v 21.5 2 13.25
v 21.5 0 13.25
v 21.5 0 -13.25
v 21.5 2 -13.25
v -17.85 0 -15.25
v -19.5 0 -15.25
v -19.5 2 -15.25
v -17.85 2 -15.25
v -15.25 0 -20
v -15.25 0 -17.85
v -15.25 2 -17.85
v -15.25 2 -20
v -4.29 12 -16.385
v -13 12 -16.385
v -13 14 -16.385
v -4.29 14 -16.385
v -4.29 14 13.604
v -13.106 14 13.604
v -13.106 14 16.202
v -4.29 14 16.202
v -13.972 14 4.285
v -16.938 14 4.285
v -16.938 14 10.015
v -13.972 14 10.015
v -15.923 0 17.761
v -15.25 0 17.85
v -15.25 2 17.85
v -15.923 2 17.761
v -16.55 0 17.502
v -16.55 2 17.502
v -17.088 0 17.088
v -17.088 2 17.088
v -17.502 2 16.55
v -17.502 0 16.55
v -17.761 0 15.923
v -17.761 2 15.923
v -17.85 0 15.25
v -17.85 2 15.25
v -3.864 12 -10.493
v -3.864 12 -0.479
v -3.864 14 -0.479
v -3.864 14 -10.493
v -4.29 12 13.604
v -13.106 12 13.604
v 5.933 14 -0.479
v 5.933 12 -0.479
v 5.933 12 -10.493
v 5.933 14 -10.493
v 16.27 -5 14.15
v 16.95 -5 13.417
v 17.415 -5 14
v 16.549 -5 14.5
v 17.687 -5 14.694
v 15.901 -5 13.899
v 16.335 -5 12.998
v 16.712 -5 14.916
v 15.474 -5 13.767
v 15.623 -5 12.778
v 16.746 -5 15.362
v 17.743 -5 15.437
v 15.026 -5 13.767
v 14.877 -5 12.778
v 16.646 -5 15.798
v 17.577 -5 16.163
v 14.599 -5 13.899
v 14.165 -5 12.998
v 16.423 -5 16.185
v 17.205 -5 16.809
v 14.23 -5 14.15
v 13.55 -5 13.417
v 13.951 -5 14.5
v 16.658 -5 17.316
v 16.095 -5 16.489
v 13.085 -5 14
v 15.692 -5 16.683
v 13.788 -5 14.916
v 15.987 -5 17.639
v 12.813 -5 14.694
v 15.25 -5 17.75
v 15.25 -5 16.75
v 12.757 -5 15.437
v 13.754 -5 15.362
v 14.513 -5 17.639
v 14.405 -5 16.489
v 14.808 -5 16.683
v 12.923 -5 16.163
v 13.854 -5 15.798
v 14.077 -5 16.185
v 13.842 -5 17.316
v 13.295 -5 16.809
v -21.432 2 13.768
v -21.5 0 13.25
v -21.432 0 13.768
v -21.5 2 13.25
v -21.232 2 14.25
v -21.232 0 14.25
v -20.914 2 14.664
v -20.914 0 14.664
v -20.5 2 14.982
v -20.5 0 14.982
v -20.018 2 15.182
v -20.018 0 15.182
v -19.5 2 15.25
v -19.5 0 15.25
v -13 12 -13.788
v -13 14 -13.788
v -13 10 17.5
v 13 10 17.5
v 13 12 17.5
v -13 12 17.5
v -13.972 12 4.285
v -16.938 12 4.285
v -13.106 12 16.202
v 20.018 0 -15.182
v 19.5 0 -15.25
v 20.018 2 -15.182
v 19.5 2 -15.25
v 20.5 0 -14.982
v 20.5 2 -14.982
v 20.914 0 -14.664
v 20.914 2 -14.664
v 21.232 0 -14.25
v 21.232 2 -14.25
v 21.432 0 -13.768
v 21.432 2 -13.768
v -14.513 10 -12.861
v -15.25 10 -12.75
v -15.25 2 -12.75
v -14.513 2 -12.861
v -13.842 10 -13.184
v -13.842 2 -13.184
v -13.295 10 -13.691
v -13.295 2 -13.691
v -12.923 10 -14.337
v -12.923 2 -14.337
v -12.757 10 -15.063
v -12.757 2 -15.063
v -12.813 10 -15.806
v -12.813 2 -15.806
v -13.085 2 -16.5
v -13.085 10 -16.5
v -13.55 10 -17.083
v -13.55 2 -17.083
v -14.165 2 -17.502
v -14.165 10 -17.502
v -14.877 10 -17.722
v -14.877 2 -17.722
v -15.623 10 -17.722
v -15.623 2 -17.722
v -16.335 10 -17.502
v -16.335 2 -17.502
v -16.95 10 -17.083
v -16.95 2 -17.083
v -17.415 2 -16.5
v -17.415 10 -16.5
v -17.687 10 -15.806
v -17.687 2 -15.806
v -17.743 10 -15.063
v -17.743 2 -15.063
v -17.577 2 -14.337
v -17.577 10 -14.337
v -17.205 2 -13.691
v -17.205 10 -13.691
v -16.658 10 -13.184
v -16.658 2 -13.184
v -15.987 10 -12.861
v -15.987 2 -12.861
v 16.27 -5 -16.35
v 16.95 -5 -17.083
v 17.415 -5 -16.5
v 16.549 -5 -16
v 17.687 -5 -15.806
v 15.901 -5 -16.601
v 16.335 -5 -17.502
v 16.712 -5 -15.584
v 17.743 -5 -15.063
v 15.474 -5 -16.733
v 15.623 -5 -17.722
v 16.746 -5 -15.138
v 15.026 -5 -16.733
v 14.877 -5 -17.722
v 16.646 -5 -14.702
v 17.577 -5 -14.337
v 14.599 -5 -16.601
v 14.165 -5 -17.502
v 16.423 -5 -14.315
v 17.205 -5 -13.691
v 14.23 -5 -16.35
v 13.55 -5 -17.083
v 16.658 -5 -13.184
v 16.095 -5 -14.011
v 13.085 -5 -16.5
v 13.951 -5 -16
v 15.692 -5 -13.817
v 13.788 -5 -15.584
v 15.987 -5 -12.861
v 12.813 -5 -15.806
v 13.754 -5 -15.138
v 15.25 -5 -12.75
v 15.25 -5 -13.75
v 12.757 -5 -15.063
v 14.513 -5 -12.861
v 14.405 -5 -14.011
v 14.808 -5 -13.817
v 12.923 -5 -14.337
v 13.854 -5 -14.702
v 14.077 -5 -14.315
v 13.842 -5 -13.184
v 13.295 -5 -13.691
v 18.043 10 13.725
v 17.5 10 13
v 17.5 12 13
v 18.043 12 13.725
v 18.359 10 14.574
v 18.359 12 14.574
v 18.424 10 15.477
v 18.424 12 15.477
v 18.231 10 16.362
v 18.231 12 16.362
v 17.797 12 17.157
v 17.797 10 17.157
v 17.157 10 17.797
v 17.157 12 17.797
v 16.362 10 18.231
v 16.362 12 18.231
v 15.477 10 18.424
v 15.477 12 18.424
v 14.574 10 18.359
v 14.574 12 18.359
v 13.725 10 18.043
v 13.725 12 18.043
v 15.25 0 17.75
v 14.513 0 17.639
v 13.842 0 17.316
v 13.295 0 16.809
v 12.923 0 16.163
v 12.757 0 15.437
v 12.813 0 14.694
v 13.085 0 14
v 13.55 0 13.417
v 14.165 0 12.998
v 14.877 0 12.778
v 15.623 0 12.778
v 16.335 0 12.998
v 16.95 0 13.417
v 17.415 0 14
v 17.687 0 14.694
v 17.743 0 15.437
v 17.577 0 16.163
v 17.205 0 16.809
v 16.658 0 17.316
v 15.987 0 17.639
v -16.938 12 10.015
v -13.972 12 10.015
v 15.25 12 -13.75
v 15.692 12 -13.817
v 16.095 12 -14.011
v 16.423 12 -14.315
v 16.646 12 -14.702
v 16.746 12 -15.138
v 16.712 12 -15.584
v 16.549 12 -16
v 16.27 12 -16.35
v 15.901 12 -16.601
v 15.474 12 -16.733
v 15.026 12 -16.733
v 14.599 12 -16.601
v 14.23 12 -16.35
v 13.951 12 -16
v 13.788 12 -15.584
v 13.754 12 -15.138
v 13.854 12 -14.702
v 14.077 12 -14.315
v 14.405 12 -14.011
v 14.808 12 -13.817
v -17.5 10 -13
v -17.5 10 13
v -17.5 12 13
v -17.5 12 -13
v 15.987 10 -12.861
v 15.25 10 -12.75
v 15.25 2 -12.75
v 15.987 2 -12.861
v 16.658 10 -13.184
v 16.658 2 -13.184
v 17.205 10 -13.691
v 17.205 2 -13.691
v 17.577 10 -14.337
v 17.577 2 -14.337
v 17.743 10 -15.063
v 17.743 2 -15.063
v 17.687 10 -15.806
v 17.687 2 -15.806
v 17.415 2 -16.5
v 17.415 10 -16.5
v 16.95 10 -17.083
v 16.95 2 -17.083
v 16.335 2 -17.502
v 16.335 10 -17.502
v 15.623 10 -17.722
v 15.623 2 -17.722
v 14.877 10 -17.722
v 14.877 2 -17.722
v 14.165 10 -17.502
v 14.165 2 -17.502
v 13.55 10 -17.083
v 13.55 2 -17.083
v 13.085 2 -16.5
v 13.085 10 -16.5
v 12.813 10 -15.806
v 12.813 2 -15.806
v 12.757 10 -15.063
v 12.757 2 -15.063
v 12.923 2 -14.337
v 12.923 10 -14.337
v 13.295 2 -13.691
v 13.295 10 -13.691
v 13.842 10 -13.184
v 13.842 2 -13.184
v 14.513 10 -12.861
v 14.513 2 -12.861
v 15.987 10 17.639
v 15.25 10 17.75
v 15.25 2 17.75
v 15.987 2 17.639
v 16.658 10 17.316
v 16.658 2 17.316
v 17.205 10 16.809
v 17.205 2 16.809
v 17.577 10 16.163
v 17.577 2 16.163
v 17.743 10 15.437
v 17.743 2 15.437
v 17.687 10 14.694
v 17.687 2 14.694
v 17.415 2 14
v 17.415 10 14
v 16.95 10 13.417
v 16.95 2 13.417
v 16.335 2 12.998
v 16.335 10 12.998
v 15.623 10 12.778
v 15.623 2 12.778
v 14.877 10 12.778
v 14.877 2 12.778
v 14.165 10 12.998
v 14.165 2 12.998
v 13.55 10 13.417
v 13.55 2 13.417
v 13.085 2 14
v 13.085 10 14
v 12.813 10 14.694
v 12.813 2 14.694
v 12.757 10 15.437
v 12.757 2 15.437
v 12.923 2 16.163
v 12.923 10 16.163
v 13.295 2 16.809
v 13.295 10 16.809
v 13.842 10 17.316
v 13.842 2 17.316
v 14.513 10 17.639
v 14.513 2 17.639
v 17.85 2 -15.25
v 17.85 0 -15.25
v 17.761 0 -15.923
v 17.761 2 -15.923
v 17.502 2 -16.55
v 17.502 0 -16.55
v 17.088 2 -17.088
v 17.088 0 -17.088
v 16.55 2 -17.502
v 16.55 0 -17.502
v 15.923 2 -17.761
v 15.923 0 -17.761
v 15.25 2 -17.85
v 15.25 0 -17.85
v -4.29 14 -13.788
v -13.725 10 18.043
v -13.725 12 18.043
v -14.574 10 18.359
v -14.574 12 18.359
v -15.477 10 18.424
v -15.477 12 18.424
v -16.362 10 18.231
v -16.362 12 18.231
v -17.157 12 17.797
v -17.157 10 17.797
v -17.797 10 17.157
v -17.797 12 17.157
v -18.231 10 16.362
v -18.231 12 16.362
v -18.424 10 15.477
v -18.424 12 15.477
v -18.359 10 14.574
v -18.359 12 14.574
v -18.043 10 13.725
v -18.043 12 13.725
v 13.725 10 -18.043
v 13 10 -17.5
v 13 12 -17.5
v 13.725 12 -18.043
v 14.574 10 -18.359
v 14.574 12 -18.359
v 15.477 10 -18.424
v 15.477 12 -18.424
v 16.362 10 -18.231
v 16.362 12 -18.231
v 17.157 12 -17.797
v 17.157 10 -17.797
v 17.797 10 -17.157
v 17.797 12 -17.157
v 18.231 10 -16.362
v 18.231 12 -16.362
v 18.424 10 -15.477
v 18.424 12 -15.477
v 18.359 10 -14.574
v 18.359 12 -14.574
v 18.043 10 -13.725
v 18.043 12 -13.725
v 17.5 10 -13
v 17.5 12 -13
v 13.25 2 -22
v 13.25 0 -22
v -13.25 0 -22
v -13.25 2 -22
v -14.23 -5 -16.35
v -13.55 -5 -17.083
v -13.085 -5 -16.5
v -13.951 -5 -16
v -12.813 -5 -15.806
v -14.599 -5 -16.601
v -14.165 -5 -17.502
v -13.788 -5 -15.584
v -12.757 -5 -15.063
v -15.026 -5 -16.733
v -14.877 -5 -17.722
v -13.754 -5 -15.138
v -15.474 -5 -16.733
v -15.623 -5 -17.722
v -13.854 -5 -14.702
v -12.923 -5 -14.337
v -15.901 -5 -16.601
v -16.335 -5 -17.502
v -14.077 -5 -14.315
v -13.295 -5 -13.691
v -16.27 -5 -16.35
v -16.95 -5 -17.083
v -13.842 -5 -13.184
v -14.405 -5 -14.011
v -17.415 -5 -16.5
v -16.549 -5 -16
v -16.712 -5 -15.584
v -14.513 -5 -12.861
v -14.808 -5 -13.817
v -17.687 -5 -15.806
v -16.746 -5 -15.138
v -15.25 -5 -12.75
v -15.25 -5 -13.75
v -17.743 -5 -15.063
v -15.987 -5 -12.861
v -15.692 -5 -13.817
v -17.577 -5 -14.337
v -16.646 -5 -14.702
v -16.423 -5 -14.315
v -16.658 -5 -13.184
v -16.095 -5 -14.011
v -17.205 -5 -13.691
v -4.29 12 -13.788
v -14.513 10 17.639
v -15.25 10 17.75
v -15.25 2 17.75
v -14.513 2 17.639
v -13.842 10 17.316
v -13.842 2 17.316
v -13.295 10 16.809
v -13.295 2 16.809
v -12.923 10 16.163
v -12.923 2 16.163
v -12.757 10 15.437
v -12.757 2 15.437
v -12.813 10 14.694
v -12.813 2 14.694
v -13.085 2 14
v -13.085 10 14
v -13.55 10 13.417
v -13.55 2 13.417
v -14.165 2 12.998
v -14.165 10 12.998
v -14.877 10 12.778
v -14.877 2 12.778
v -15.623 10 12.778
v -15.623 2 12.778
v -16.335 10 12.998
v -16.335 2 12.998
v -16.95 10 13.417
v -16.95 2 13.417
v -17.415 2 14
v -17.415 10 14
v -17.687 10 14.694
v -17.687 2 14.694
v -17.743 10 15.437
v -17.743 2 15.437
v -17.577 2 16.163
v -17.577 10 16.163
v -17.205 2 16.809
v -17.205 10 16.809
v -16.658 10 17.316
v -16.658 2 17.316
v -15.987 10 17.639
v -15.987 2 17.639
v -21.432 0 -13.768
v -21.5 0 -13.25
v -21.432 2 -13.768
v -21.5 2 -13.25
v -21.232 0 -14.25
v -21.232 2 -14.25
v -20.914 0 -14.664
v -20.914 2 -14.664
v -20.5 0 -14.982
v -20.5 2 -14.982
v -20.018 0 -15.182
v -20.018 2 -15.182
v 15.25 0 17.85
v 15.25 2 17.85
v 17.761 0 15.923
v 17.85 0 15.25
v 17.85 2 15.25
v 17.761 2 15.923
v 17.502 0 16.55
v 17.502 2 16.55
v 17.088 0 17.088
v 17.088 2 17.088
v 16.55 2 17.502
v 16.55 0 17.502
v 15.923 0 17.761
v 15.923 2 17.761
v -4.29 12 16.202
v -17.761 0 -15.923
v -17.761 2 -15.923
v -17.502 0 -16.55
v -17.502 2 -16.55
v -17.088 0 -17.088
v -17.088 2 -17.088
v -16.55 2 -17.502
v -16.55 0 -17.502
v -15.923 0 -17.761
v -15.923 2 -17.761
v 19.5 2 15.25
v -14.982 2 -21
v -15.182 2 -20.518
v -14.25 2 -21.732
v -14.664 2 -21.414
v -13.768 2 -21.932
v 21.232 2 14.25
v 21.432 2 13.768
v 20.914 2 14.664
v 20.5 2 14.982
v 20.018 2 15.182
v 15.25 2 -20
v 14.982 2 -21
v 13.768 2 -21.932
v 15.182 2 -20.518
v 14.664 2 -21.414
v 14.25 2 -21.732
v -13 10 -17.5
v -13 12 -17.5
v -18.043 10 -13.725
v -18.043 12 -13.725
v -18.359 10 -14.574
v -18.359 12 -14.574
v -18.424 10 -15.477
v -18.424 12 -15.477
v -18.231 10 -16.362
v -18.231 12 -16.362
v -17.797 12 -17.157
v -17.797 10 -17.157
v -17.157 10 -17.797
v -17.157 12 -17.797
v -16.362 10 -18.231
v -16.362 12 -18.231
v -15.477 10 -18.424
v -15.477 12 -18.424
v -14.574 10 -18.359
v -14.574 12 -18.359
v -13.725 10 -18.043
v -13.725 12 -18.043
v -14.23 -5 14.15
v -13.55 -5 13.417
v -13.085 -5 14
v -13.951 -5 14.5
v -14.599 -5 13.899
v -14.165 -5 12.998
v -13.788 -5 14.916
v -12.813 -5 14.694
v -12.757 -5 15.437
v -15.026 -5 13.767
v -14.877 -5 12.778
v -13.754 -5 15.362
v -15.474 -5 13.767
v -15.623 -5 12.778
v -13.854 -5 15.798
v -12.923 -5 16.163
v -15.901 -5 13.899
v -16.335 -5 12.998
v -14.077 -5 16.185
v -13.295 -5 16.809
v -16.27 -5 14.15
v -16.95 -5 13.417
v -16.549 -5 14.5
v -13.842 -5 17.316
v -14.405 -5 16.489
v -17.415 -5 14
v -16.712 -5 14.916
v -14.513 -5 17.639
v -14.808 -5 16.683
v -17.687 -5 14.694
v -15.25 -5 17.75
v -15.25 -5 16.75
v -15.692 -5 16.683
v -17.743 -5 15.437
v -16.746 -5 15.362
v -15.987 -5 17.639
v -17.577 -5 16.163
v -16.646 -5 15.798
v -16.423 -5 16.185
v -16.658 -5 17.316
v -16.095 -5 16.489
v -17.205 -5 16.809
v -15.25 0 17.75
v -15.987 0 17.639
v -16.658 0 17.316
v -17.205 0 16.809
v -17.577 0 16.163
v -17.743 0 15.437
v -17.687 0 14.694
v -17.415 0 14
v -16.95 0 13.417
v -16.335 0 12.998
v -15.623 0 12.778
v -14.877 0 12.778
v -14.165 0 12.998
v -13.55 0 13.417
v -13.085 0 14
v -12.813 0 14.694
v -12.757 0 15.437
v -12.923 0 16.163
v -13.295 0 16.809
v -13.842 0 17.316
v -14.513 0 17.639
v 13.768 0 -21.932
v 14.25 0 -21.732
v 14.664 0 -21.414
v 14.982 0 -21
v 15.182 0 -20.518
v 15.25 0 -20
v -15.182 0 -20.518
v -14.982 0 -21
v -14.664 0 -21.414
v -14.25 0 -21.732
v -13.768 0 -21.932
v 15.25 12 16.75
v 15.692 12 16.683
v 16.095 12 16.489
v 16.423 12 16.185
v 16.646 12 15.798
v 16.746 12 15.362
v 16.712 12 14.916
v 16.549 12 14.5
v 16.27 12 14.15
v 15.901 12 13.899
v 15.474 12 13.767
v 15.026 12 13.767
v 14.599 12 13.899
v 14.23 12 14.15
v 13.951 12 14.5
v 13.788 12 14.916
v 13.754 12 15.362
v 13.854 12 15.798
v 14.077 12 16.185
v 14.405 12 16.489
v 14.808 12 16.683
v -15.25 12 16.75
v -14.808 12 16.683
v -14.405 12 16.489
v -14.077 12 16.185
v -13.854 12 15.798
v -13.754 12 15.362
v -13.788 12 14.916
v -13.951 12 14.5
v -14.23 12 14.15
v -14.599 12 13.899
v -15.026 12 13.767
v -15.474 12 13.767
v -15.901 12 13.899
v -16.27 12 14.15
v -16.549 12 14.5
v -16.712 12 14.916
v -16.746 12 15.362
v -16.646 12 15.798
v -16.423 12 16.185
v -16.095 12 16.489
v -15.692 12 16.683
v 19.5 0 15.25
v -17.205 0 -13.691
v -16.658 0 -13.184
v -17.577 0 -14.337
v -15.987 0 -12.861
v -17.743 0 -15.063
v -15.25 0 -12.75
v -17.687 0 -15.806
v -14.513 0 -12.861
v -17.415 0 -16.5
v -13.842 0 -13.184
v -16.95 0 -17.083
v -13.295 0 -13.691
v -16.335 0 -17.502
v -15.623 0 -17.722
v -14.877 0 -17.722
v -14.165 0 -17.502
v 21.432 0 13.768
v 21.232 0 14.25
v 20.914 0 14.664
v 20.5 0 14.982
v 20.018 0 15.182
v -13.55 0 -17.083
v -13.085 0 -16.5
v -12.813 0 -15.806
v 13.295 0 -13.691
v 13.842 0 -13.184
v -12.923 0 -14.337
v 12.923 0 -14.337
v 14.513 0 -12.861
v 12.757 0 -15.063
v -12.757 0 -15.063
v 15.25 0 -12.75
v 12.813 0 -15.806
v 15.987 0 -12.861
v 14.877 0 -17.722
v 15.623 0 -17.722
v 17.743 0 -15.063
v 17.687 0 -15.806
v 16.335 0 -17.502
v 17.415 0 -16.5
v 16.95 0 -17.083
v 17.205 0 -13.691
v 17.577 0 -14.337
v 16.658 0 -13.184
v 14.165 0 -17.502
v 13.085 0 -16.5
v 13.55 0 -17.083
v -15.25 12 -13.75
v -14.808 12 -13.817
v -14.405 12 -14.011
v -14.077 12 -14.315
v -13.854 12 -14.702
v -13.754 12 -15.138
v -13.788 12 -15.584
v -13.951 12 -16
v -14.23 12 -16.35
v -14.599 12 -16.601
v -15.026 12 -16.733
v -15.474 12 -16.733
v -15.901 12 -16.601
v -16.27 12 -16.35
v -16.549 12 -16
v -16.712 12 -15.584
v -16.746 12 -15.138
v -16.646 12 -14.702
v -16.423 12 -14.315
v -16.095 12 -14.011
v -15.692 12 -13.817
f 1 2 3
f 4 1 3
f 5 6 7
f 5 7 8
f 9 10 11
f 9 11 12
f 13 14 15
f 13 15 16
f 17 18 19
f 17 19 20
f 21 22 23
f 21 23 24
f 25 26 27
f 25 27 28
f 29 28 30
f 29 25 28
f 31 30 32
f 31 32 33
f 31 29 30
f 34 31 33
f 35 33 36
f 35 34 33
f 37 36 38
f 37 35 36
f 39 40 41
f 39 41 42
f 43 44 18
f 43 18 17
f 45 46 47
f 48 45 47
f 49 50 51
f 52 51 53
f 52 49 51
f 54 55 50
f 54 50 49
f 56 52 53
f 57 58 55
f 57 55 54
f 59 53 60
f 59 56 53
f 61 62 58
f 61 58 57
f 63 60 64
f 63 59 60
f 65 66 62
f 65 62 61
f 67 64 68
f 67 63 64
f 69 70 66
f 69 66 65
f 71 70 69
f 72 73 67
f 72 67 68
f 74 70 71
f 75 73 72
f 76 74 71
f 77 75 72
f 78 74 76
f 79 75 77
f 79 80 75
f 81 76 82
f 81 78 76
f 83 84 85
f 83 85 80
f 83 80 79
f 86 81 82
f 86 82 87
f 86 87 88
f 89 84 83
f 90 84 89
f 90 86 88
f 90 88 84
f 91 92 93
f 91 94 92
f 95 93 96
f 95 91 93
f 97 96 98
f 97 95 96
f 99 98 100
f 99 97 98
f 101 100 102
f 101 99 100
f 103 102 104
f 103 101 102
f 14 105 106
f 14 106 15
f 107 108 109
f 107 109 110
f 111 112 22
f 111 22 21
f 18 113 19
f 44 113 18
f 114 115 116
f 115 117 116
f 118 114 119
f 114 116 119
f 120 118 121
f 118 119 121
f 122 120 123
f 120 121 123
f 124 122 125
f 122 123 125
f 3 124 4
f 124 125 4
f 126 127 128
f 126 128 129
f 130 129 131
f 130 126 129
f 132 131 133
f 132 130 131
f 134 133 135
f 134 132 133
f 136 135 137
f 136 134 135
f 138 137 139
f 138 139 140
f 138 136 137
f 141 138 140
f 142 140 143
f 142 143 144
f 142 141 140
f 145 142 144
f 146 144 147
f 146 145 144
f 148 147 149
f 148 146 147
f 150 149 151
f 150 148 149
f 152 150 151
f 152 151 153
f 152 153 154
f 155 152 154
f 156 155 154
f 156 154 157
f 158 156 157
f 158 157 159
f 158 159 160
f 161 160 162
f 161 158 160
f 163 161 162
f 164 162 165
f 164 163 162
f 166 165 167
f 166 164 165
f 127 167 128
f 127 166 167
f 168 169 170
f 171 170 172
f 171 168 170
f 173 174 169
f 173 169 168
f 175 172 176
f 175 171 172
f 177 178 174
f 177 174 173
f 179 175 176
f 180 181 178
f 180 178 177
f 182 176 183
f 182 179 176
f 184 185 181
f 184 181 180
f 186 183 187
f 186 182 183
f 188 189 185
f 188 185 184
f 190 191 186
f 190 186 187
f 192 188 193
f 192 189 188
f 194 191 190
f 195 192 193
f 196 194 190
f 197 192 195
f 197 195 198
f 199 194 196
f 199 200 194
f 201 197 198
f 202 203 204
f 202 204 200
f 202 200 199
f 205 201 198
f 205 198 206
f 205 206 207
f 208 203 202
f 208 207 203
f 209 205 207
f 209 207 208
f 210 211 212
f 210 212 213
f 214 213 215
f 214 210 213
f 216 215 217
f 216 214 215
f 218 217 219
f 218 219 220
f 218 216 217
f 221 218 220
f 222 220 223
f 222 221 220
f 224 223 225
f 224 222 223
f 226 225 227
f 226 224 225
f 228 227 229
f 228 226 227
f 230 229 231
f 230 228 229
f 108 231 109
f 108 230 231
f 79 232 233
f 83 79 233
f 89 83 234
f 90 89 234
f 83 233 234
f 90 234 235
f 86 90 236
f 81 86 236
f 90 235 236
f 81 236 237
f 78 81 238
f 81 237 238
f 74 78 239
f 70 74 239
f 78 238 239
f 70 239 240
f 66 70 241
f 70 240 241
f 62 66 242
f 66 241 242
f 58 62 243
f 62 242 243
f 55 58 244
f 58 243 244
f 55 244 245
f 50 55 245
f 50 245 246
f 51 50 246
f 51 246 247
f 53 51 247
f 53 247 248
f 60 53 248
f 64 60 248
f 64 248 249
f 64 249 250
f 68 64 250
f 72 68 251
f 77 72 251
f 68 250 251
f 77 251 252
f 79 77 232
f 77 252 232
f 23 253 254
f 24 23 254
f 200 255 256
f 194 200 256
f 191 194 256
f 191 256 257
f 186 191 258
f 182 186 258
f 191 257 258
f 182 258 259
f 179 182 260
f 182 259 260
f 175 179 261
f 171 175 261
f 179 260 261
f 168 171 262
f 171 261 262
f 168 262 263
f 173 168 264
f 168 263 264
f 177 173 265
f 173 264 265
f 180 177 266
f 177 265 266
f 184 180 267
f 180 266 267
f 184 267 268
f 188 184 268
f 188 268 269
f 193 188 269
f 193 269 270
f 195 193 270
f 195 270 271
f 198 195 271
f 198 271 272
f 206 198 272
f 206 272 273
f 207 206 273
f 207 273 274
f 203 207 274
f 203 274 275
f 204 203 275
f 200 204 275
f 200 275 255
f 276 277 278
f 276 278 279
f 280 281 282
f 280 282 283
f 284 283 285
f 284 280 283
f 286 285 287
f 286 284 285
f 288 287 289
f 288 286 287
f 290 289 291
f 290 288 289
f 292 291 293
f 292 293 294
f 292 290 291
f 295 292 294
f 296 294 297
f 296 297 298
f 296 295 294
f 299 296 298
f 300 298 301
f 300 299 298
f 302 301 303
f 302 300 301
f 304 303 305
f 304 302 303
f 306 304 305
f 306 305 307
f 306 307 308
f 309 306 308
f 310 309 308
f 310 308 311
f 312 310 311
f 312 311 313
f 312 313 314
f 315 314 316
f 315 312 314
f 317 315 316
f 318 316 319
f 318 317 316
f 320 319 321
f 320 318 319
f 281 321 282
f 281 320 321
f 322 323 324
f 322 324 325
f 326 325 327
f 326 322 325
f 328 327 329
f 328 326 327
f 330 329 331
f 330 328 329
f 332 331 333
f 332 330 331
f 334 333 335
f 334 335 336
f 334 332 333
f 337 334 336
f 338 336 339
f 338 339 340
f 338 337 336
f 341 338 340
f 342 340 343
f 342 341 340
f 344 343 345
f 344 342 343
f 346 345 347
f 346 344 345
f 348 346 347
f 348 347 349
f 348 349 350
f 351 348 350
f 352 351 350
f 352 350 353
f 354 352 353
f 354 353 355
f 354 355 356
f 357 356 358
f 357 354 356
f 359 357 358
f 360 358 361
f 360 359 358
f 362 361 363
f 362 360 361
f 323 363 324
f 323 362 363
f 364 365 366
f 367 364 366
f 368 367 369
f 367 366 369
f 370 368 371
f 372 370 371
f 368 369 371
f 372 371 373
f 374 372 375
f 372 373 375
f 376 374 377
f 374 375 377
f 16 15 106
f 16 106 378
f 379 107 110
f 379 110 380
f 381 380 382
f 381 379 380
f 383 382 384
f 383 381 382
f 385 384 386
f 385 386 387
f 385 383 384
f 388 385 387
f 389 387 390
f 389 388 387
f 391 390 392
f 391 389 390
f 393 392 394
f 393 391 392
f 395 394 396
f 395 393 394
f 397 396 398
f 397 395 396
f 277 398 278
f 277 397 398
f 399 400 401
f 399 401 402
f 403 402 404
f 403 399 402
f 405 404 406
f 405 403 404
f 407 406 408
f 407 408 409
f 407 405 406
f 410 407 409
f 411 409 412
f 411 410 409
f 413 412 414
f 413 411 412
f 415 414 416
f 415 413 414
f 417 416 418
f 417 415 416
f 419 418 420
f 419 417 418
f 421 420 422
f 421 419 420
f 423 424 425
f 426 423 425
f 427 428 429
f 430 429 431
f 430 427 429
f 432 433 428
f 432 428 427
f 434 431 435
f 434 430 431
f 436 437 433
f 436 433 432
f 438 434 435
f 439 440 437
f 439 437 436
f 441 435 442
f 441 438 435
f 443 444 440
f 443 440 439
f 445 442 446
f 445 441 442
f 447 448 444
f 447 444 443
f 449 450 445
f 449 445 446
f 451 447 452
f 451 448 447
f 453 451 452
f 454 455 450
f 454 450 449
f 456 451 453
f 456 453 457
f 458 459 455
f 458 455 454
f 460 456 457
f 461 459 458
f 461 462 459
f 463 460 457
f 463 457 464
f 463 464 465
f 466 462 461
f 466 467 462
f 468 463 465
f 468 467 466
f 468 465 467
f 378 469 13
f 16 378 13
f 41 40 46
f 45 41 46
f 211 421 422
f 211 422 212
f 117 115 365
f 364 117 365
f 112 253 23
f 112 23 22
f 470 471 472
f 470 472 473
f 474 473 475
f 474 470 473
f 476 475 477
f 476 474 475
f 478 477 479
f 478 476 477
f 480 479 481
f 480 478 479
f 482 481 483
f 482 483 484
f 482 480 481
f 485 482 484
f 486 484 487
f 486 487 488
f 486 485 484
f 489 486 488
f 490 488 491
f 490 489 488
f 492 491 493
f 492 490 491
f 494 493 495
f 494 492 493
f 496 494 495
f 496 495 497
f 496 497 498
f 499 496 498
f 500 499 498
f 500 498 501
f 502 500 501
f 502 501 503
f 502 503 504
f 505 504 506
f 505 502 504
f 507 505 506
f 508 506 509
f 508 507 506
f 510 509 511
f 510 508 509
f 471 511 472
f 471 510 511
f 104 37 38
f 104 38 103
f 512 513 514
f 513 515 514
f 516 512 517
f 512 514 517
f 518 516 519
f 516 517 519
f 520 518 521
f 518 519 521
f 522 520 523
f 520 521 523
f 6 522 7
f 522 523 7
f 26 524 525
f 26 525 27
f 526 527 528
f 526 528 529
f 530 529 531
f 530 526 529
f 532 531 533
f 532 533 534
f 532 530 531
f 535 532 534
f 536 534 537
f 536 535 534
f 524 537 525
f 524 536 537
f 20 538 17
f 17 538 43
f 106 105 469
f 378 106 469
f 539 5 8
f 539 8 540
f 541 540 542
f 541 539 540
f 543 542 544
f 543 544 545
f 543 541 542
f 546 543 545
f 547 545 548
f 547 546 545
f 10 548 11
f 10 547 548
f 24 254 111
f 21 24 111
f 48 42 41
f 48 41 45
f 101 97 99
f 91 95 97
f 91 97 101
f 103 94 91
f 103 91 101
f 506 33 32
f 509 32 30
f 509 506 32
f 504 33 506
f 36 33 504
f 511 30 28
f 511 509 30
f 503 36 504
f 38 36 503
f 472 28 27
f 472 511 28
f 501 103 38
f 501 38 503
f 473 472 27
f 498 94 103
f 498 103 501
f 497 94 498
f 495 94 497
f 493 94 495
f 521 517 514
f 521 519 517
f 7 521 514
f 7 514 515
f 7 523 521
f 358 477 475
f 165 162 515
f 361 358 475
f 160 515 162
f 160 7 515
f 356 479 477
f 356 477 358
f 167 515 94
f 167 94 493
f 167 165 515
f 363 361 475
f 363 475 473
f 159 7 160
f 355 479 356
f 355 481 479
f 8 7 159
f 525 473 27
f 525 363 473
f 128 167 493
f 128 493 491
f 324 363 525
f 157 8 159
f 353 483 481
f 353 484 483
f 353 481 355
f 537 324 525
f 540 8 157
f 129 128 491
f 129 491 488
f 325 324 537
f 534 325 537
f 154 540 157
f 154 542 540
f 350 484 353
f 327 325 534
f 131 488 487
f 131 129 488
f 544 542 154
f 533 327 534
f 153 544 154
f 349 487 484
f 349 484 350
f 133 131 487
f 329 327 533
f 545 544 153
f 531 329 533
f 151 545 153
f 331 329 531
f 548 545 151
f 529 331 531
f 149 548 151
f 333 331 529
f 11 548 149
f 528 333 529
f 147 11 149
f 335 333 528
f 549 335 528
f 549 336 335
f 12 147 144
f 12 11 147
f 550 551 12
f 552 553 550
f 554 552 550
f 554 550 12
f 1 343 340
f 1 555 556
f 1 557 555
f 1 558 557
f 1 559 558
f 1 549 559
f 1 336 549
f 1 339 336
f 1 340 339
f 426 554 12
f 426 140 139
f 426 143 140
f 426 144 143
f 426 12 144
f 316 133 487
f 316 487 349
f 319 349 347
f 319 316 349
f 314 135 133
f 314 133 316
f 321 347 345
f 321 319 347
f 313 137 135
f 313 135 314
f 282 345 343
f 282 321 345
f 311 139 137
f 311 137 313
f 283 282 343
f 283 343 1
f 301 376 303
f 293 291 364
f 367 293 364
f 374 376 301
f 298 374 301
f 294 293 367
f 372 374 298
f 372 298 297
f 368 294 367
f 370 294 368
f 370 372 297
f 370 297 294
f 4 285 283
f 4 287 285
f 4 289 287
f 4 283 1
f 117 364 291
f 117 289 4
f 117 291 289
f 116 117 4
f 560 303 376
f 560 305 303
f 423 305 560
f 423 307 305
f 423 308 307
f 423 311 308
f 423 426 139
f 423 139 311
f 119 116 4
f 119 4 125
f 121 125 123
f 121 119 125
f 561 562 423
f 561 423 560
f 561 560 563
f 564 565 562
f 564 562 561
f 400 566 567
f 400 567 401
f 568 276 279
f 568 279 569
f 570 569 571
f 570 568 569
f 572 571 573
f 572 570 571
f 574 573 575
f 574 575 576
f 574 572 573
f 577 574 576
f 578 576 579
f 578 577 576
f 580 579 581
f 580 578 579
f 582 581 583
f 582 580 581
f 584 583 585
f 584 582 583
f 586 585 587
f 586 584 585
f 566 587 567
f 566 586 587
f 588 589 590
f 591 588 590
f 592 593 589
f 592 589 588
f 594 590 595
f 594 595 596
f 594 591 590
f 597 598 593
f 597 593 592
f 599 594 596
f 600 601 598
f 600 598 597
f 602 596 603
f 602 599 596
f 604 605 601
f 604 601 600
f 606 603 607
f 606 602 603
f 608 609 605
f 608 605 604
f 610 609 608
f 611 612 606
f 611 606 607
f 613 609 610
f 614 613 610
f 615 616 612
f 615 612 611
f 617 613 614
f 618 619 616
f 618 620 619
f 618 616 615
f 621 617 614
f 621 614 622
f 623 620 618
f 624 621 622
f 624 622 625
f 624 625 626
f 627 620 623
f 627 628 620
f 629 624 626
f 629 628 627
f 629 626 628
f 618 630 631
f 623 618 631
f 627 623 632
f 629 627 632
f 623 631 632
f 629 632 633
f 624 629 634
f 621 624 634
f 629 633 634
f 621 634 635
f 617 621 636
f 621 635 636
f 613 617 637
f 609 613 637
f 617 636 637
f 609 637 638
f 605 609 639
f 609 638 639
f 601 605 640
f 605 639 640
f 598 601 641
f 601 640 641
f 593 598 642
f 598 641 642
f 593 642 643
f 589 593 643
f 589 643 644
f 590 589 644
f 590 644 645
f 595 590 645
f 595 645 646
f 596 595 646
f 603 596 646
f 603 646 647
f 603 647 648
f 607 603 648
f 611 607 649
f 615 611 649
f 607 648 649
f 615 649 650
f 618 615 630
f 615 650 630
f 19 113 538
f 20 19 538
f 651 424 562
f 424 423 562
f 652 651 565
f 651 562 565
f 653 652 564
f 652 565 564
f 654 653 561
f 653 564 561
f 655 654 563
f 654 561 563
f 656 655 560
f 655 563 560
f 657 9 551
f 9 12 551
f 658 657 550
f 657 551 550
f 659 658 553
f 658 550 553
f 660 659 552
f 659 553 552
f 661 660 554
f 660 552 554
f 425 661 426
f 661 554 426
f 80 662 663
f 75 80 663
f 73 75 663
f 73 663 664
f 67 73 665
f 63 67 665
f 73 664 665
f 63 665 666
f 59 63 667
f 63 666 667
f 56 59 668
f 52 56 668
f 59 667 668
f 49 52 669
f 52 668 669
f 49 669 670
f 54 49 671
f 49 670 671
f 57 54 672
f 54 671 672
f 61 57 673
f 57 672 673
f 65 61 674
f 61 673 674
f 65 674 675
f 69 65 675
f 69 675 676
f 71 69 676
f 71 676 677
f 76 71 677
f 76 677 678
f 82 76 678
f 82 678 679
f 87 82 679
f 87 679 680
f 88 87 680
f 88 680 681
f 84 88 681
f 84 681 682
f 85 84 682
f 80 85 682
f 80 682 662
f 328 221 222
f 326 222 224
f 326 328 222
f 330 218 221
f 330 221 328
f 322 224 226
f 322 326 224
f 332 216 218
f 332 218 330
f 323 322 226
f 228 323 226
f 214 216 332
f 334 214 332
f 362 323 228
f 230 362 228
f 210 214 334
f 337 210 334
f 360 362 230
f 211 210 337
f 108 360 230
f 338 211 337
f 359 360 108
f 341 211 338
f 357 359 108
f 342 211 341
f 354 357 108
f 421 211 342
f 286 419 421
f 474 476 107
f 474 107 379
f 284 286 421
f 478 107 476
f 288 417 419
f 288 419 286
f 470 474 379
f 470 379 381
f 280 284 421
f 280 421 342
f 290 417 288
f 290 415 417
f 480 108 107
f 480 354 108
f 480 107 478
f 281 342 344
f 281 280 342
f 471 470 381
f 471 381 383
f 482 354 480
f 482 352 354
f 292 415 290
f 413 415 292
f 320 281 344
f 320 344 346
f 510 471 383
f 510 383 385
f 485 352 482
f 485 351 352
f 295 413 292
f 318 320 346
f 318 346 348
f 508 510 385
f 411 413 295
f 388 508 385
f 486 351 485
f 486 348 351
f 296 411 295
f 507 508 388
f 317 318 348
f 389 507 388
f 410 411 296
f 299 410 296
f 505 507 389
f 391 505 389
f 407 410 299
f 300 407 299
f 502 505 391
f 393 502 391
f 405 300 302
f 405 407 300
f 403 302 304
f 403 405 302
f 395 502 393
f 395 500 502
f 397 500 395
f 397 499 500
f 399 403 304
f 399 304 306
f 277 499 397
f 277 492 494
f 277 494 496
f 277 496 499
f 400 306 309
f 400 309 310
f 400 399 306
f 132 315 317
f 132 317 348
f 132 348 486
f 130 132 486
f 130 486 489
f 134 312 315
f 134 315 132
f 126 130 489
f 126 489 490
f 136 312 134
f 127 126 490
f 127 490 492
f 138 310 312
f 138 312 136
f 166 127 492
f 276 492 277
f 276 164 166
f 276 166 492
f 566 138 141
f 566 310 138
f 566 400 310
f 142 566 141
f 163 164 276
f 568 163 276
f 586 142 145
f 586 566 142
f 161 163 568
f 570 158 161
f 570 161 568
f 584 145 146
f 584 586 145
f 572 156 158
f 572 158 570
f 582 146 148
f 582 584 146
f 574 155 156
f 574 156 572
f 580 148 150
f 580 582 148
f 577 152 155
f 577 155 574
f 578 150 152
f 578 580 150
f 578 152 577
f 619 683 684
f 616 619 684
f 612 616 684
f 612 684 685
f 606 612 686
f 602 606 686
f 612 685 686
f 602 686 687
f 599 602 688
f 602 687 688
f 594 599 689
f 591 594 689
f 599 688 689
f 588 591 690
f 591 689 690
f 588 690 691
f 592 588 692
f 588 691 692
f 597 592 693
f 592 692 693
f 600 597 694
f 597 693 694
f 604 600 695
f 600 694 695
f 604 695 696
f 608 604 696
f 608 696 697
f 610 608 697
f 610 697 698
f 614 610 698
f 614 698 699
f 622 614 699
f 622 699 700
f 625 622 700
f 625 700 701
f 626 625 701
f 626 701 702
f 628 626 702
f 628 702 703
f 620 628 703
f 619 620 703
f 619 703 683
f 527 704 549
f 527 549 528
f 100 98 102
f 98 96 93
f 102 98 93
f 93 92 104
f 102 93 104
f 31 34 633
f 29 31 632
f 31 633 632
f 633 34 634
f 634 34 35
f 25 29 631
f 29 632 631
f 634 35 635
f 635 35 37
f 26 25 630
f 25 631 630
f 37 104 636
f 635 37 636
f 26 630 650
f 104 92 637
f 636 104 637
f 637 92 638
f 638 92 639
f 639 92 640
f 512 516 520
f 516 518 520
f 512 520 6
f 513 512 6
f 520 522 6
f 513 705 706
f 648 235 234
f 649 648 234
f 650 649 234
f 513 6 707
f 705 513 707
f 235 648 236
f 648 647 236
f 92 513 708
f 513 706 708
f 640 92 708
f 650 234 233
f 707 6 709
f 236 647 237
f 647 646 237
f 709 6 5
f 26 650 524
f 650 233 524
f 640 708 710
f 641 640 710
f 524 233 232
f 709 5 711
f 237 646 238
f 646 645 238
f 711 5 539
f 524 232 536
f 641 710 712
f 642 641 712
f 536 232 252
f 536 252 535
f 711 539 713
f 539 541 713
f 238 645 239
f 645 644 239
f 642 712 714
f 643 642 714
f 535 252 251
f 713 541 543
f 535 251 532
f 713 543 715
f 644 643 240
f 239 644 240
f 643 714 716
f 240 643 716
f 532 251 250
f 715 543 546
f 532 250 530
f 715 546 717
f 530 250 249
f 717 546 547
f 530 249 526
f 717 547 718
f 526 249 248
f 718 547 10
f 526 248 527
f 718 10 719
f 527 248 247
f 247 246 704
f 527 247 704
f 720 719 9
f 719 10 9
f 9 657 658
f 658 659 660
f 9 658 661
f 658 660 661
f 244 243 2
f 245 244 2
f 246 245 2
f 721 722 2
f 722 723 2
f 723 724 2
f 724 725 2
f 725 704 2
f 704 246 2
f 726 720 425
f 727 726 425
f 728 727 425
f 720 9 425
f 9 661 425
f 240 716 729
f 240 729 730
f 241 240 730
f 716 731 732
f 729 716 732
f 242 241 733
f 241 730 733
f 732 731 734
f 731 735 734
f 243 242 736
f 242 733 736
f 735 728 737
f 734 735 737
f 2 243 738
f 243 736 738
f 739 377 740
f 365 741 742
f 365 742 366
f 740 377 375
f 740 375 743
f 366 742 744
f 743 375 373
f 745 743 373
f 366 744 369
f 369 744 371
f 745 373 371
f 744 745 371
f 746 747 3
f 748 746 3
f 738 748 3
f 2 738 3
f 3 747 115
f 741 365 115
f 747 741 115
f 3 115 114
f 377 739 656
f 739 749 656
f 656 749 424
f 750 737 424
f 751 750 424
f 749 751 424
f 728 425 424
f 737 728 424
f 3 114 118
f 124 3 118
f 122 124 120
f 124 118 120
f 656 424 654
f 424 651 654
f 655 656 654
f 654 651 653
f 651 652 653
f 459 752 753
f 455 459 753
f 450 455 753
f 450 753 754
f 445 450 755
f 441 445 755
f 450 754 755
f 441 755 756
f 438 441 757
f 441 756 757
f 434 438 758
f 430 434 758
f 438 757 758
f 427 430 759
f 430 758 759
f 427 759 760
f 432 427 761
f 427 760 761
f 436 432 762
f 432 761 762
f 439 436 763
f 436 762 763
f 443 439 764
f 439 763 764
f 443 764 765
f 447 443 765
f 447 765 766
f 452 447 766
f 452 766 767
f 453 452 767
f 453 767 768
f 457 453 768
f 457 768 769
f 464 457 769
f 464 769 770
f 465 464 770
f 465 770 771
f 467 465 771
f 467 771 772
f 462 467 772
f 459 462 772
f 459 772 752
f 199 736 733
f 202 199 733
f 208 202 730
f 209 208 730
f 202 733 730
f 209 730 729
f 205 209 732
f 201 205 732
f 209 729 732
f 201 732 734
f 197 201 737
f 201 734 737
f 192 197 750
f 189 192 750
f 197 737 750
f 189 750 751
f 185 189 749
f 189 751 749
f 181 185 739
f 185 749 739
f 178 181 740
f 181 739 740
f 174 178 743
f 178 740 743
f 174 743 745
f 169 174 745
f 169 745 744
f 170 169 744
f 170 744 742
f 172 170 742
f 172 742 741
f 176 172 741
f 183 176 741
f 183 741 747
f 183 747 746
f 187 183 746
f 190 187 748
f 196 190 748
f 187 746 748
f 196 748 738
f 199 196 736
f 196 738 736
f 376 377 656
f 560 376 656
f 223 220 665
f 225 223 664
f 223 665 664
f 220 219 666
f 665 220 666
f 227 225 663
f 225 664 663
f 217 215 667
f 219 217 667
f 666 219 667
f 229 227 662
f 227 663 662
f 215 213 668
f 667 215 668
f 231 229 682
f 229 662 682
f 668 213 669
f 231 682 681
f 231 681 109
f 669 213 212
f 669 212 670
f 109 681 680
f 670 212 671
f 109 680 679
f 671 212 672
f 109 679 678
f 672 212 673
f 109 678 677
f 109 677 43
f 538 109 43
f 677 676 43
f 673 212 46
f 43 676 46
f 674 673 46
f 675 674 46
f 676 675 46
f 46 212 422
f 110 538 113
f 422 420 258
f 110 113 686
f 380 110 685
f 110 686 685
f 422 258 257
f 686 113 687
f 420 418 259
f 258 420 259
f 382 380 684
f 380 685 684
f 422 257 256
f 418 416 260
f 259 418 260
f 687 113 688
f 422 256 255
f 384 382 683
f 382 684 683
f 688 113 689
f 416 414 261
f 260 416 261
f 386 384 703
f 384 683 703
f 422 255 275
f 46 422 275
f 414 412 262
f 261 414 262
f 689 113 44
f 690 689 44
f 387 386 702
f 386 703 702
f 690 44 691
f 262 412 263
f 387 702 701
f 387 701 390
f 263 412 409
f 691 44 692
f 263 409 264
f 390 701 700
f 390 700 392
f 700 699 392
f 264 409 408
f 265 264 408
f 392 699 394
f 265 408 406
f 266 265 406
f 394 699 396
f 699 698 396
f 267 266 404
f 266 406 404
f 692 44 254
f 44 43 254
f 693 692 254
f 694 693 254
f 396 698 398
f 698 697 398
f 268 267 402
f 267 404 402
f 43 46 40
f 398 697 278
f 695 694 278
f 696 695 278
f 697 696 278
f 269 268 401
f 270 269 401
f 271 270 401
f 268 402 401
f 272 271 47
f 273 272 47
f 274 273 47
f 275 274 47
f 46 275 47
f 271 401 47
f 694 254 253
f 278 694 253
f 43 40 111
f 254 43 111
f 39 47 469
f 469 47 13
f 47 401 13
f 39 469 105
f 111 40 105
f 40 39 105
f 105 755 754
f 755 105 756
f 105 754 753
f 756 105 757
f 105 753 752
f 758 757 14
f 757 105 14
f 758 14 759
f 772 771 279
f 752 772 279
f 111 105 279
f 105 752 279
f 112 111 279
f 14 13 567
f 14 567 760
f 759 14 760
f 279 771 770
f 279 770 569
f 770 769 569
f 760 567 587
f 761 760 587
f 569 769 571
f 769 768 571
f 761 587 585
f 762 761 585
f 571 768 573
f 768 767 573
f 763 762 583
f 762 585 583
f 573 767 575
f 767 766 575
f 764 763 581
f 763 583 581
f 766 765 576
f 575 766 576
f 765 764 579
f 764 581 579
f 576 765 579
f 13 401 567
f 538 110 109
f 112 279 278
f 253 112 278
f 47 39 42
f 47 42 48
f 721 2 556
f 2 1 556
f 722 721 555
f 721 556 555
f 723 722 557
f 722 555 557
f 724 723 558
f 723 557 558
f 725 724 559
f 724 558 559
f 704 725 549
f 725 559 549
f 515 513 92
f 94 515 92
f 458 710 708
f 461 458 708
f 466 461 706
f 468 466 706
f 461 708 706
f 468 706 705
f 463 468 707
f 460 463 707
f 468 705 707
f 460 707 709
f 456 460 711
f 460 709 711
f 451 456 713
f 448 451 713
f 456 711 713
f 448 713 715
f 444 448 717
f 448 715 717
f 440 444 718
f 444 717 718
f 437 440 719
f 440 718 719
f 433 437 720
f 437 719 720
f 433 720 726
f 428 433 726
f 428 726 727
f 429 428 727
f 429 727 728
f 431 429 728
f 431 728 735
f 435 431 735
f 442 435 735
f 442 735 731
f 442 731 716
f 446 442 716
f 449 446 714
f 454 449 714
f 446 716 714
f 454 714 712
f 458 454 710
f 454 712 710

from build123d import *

# Parameters (mm, degrees)
EXTRUDE_1_DEPTH     = 2
SKETCH_2_R          = 2.5
EXTRUDE_2_DEPTH     = 5
EXTRUDE_START       = 8
SKETCH_3_R          = 2.5
EXTRUDE_3_DEPTH     = 8
EXTRUDE_4_DEPTH     = 2
CUT_EXTRUDE_1_DEPTH = 2
FILLET_1_R          = 2
SKETCH_6_W          = 8.710152629
SKETCH_6_H          = 2.597522262
SKETCH_6_W_2        = 2.966490945
SKETCH_6_H_2        = 5.729895294
SKETCH_6_W_3        = 8.81583313
SKETCH_6_H_3        = 2.597522261
SKETCH_6_W_4        = 9.797596015
SKETCH_6_H_4        = 10.014261194
EXTRUDE_5_DEPTH     = 2
SKETCH_7_R          = 1.5
CUT_EXTRUDE_2_DEPTH = 36.146123542


with BuildPart() as part:
    # 草图1 → 凸台-拉伸1 (new body)
    with BuildSketch(Plane(origin=(0, 0, 0), x_dir=(1, 0, 0), z_dir=(0, 1, 0))):
        Polygon((-21.5, -22), (-19.5, -22), (-19.5, -23), (19.5, -23), (19.5, -22), (21.5, -22), (21.5, 22), (-21.5, 22), align=None)
    extrude(amount=EXTRUDE_1_DEPTH)

    # 草图2 → 凸台-拉伸2 (add)
    with BuildSketch(Plane.XZ):
        with Locations(Location((-15.25, 15.25, 0), (0, 0, 90))):
            Circle(SKETCH_2_R)
        with Locations(Location((15.25, 15.25, 0), (0, 0, 90))):
            Circle(SKETCH_2_R)
        with Locations(Location((15.25, -15.25, 0), (0, 0, 90))):
            Circle(SKETCH_2_R)
        with Locations(Location((-15.25, -15.25, 0), (0, 0, 90))):
            Circle(SKETCH_2_R)
    extrude(amount=EXTRUDE_2_DEPTH)

    # 草图3 → 凸台-拉伸3 (add)
    with BuildSketch(Plane(origin=(0, 2, 0), x_dir=(1, 0, 0), z_dir=(0, 1, 0)).offset(EXTRUDE_START)):
        with Locations(Location((-15.25, 15.25, 0), (0, 0, 270))):
            Circle(SKETCH_3_R)
        with Locations(Location((15.25, 15.25, 0), (0, 0, 270))):
            Circle(SKETCH_3_R)
        with Locations(Location((15.25, -15.25, 0), (0, 0, 270))):
            Circle(SKETCH_3_R)
        with Locations(Location((-15.25, -15.25, 0), (0, 0, 270))):
            Circle(SKETCH_3_R)
    extrude(amount=-EXTRUDE_3_DEPTH)

    # 草图4 → 凸台-拉伸4 (add)
    with BuildSketch(Plane(origin=(0, 10, 0), x_dir=(1, 0, 0), z_dir=(0, 1, 0))):
        with BuildLine():
            Line((-13, 17.5), (13, 17.5))
            ThreePointArc((13, 17.5), (17.5, 17.5), (17.5, 13))
            Line((17.5, 13), (17.5, -13))
            ThreePointArc((17.5, -13), (17.5, -17.5), (13, -17.5))
            Line((13, -17.5), (-13, -17.5))
            ThreePointArc((-13, -17.5), (-17.5, -17.5), (-17.5, -13))
            Line((-17.5, -13), (-17.5, 13))
            ThreePointArc((-17.5, 13), (-17.5, 17.5), (-13, 17.5))
        make_face()
    extrude(amount=EXTRUDE_4_DEPTH)

    # 草图5 → 切除-拉伸1 (cut)
    with BuildSketch(Plane.XZ):
        with BuildLine():
            Line((15.25, 17.85), (-15.25, 17.85))
            ThreePointArc((-15.25, 17.85), (-17.088477631, 17.088477631), (-17.85, 15.25))
            Line((-17.85, 15.25), (-21.5, 15.25))
            Line((-21.5, 15.25), (-21.5, 22))
            Line((-21.5, 22), (-19.5, 22))
            Line((-19.5, 22), (-19.5, 23))
            Line((-19.5, 23), (19.5, 23))
            Line((19.5, 23), (19.5, 22))
            Line((19.5, 22), (21.5, 22))
            Line((21.5, 22), (21.5, 15.25))
            Line((21.5, 15.25), (17.85, 15.25))
            ThreePointArc((17.85, 15.25), (17.088477631, 17.088477631), (15.25, 17.85))
        make_face()
        with BuildLine():
            Line((21.5, -15.25), (17.85, -15.25))
            ThreePointArc((17.85, -15.25), (17.088477631, -17.088477631), (15.25, -17.85))
            Line((15.25, -17.85), (15.25, -22))
            Line((15.25, -22), (21.5, -22))
            Line((21.5, -22), (21.5, -15.25))
        make_face()
        with BuildLine():
            Line((-21.5, -15.25), (-17.85, -15.25))
            ThreePointArc((-17.85, -15.25), (-17.088477631, -17.088477631), (-15.25, -17.85))
            Line((-15.25, -17.85), (-15.25, -22))
            Line((-15.25, -22), (-21.5, -22))
            Line((-21.5, -22), (-21.5, -15.25))
        make_face()
    extrude(amount=-CUT_EXTRUDE_1_DEPTH, mode=Mode.SUBTRACT)

    # 圆角1
    fillet_1_edges = [part.edges().sort_by_distance(p)[0] for p in [
        (-21.5, 1, 15.25),
        (21.5, 1, 15.25),
        (21.5, 1, -15.25),
        (15.25, 1, -22),
        (-21.5, 1, -15.25),
        (-15.25, 1, -22),
    ]]
    fillet(fillet_1_edges, radius=FILLET_1_R)

    # 草图6 → 凸台-拉伸5 (add)
    with BuildSketch(Plane(origin=(0, 12, 0), x_dir=(1, 0, 0), z_dir=(0, 1, 0))):
        with Locations((-8.644923686, 15.086472233)):
            Rectangle(SKETCH_6_W, SKETCH_6_H)
        with Locations((-15.454766728, -7.149892581)):
            Rectangle(SKETCH_6_W_2, SKETCH_6_H_2)
        with Locations((-8.697763936, -14.903102968)):
            Rectangle(SKETCH_6_W_3, SKETCH_6_H_3)
        with Locations((1.034483131, 5.486228782)):
            Rectangle(SKETCH_6_W_4, SKETCH_6_H_4)
    extrude(amount=EXTRUDE_5_DEPTH)

    # 草图7 → 切除-拉伸2 (cut, through all)
    with BuildSketch(Plane(origin=(0, 12, 0), x_dir=(1, 0, 0), z_dir=(0, 1, 0))):
        with Locations(Location((-15.25, 15.25, 0), (0, 0, 270))):
            Circle(SKETCH_7_R)
        with Locations(Location((15.25, 15.25, 0), (0, 0, 270))):
            Circle(SKETCH_7_R)
        with Locations(Location((15.25, -15.25, 0), (0, 0, 270))):
            Circle(SKETCH_7_R)
        with Locations(Location((-15.25, -15.25, 0), (0, 0, 270))):
            Circle(SKETCH_7_R)
    extrude(amount=-CUT_EXTRUDE_2_DEPTH, mode=Mode.SUBTRACT)


solid = part.part
